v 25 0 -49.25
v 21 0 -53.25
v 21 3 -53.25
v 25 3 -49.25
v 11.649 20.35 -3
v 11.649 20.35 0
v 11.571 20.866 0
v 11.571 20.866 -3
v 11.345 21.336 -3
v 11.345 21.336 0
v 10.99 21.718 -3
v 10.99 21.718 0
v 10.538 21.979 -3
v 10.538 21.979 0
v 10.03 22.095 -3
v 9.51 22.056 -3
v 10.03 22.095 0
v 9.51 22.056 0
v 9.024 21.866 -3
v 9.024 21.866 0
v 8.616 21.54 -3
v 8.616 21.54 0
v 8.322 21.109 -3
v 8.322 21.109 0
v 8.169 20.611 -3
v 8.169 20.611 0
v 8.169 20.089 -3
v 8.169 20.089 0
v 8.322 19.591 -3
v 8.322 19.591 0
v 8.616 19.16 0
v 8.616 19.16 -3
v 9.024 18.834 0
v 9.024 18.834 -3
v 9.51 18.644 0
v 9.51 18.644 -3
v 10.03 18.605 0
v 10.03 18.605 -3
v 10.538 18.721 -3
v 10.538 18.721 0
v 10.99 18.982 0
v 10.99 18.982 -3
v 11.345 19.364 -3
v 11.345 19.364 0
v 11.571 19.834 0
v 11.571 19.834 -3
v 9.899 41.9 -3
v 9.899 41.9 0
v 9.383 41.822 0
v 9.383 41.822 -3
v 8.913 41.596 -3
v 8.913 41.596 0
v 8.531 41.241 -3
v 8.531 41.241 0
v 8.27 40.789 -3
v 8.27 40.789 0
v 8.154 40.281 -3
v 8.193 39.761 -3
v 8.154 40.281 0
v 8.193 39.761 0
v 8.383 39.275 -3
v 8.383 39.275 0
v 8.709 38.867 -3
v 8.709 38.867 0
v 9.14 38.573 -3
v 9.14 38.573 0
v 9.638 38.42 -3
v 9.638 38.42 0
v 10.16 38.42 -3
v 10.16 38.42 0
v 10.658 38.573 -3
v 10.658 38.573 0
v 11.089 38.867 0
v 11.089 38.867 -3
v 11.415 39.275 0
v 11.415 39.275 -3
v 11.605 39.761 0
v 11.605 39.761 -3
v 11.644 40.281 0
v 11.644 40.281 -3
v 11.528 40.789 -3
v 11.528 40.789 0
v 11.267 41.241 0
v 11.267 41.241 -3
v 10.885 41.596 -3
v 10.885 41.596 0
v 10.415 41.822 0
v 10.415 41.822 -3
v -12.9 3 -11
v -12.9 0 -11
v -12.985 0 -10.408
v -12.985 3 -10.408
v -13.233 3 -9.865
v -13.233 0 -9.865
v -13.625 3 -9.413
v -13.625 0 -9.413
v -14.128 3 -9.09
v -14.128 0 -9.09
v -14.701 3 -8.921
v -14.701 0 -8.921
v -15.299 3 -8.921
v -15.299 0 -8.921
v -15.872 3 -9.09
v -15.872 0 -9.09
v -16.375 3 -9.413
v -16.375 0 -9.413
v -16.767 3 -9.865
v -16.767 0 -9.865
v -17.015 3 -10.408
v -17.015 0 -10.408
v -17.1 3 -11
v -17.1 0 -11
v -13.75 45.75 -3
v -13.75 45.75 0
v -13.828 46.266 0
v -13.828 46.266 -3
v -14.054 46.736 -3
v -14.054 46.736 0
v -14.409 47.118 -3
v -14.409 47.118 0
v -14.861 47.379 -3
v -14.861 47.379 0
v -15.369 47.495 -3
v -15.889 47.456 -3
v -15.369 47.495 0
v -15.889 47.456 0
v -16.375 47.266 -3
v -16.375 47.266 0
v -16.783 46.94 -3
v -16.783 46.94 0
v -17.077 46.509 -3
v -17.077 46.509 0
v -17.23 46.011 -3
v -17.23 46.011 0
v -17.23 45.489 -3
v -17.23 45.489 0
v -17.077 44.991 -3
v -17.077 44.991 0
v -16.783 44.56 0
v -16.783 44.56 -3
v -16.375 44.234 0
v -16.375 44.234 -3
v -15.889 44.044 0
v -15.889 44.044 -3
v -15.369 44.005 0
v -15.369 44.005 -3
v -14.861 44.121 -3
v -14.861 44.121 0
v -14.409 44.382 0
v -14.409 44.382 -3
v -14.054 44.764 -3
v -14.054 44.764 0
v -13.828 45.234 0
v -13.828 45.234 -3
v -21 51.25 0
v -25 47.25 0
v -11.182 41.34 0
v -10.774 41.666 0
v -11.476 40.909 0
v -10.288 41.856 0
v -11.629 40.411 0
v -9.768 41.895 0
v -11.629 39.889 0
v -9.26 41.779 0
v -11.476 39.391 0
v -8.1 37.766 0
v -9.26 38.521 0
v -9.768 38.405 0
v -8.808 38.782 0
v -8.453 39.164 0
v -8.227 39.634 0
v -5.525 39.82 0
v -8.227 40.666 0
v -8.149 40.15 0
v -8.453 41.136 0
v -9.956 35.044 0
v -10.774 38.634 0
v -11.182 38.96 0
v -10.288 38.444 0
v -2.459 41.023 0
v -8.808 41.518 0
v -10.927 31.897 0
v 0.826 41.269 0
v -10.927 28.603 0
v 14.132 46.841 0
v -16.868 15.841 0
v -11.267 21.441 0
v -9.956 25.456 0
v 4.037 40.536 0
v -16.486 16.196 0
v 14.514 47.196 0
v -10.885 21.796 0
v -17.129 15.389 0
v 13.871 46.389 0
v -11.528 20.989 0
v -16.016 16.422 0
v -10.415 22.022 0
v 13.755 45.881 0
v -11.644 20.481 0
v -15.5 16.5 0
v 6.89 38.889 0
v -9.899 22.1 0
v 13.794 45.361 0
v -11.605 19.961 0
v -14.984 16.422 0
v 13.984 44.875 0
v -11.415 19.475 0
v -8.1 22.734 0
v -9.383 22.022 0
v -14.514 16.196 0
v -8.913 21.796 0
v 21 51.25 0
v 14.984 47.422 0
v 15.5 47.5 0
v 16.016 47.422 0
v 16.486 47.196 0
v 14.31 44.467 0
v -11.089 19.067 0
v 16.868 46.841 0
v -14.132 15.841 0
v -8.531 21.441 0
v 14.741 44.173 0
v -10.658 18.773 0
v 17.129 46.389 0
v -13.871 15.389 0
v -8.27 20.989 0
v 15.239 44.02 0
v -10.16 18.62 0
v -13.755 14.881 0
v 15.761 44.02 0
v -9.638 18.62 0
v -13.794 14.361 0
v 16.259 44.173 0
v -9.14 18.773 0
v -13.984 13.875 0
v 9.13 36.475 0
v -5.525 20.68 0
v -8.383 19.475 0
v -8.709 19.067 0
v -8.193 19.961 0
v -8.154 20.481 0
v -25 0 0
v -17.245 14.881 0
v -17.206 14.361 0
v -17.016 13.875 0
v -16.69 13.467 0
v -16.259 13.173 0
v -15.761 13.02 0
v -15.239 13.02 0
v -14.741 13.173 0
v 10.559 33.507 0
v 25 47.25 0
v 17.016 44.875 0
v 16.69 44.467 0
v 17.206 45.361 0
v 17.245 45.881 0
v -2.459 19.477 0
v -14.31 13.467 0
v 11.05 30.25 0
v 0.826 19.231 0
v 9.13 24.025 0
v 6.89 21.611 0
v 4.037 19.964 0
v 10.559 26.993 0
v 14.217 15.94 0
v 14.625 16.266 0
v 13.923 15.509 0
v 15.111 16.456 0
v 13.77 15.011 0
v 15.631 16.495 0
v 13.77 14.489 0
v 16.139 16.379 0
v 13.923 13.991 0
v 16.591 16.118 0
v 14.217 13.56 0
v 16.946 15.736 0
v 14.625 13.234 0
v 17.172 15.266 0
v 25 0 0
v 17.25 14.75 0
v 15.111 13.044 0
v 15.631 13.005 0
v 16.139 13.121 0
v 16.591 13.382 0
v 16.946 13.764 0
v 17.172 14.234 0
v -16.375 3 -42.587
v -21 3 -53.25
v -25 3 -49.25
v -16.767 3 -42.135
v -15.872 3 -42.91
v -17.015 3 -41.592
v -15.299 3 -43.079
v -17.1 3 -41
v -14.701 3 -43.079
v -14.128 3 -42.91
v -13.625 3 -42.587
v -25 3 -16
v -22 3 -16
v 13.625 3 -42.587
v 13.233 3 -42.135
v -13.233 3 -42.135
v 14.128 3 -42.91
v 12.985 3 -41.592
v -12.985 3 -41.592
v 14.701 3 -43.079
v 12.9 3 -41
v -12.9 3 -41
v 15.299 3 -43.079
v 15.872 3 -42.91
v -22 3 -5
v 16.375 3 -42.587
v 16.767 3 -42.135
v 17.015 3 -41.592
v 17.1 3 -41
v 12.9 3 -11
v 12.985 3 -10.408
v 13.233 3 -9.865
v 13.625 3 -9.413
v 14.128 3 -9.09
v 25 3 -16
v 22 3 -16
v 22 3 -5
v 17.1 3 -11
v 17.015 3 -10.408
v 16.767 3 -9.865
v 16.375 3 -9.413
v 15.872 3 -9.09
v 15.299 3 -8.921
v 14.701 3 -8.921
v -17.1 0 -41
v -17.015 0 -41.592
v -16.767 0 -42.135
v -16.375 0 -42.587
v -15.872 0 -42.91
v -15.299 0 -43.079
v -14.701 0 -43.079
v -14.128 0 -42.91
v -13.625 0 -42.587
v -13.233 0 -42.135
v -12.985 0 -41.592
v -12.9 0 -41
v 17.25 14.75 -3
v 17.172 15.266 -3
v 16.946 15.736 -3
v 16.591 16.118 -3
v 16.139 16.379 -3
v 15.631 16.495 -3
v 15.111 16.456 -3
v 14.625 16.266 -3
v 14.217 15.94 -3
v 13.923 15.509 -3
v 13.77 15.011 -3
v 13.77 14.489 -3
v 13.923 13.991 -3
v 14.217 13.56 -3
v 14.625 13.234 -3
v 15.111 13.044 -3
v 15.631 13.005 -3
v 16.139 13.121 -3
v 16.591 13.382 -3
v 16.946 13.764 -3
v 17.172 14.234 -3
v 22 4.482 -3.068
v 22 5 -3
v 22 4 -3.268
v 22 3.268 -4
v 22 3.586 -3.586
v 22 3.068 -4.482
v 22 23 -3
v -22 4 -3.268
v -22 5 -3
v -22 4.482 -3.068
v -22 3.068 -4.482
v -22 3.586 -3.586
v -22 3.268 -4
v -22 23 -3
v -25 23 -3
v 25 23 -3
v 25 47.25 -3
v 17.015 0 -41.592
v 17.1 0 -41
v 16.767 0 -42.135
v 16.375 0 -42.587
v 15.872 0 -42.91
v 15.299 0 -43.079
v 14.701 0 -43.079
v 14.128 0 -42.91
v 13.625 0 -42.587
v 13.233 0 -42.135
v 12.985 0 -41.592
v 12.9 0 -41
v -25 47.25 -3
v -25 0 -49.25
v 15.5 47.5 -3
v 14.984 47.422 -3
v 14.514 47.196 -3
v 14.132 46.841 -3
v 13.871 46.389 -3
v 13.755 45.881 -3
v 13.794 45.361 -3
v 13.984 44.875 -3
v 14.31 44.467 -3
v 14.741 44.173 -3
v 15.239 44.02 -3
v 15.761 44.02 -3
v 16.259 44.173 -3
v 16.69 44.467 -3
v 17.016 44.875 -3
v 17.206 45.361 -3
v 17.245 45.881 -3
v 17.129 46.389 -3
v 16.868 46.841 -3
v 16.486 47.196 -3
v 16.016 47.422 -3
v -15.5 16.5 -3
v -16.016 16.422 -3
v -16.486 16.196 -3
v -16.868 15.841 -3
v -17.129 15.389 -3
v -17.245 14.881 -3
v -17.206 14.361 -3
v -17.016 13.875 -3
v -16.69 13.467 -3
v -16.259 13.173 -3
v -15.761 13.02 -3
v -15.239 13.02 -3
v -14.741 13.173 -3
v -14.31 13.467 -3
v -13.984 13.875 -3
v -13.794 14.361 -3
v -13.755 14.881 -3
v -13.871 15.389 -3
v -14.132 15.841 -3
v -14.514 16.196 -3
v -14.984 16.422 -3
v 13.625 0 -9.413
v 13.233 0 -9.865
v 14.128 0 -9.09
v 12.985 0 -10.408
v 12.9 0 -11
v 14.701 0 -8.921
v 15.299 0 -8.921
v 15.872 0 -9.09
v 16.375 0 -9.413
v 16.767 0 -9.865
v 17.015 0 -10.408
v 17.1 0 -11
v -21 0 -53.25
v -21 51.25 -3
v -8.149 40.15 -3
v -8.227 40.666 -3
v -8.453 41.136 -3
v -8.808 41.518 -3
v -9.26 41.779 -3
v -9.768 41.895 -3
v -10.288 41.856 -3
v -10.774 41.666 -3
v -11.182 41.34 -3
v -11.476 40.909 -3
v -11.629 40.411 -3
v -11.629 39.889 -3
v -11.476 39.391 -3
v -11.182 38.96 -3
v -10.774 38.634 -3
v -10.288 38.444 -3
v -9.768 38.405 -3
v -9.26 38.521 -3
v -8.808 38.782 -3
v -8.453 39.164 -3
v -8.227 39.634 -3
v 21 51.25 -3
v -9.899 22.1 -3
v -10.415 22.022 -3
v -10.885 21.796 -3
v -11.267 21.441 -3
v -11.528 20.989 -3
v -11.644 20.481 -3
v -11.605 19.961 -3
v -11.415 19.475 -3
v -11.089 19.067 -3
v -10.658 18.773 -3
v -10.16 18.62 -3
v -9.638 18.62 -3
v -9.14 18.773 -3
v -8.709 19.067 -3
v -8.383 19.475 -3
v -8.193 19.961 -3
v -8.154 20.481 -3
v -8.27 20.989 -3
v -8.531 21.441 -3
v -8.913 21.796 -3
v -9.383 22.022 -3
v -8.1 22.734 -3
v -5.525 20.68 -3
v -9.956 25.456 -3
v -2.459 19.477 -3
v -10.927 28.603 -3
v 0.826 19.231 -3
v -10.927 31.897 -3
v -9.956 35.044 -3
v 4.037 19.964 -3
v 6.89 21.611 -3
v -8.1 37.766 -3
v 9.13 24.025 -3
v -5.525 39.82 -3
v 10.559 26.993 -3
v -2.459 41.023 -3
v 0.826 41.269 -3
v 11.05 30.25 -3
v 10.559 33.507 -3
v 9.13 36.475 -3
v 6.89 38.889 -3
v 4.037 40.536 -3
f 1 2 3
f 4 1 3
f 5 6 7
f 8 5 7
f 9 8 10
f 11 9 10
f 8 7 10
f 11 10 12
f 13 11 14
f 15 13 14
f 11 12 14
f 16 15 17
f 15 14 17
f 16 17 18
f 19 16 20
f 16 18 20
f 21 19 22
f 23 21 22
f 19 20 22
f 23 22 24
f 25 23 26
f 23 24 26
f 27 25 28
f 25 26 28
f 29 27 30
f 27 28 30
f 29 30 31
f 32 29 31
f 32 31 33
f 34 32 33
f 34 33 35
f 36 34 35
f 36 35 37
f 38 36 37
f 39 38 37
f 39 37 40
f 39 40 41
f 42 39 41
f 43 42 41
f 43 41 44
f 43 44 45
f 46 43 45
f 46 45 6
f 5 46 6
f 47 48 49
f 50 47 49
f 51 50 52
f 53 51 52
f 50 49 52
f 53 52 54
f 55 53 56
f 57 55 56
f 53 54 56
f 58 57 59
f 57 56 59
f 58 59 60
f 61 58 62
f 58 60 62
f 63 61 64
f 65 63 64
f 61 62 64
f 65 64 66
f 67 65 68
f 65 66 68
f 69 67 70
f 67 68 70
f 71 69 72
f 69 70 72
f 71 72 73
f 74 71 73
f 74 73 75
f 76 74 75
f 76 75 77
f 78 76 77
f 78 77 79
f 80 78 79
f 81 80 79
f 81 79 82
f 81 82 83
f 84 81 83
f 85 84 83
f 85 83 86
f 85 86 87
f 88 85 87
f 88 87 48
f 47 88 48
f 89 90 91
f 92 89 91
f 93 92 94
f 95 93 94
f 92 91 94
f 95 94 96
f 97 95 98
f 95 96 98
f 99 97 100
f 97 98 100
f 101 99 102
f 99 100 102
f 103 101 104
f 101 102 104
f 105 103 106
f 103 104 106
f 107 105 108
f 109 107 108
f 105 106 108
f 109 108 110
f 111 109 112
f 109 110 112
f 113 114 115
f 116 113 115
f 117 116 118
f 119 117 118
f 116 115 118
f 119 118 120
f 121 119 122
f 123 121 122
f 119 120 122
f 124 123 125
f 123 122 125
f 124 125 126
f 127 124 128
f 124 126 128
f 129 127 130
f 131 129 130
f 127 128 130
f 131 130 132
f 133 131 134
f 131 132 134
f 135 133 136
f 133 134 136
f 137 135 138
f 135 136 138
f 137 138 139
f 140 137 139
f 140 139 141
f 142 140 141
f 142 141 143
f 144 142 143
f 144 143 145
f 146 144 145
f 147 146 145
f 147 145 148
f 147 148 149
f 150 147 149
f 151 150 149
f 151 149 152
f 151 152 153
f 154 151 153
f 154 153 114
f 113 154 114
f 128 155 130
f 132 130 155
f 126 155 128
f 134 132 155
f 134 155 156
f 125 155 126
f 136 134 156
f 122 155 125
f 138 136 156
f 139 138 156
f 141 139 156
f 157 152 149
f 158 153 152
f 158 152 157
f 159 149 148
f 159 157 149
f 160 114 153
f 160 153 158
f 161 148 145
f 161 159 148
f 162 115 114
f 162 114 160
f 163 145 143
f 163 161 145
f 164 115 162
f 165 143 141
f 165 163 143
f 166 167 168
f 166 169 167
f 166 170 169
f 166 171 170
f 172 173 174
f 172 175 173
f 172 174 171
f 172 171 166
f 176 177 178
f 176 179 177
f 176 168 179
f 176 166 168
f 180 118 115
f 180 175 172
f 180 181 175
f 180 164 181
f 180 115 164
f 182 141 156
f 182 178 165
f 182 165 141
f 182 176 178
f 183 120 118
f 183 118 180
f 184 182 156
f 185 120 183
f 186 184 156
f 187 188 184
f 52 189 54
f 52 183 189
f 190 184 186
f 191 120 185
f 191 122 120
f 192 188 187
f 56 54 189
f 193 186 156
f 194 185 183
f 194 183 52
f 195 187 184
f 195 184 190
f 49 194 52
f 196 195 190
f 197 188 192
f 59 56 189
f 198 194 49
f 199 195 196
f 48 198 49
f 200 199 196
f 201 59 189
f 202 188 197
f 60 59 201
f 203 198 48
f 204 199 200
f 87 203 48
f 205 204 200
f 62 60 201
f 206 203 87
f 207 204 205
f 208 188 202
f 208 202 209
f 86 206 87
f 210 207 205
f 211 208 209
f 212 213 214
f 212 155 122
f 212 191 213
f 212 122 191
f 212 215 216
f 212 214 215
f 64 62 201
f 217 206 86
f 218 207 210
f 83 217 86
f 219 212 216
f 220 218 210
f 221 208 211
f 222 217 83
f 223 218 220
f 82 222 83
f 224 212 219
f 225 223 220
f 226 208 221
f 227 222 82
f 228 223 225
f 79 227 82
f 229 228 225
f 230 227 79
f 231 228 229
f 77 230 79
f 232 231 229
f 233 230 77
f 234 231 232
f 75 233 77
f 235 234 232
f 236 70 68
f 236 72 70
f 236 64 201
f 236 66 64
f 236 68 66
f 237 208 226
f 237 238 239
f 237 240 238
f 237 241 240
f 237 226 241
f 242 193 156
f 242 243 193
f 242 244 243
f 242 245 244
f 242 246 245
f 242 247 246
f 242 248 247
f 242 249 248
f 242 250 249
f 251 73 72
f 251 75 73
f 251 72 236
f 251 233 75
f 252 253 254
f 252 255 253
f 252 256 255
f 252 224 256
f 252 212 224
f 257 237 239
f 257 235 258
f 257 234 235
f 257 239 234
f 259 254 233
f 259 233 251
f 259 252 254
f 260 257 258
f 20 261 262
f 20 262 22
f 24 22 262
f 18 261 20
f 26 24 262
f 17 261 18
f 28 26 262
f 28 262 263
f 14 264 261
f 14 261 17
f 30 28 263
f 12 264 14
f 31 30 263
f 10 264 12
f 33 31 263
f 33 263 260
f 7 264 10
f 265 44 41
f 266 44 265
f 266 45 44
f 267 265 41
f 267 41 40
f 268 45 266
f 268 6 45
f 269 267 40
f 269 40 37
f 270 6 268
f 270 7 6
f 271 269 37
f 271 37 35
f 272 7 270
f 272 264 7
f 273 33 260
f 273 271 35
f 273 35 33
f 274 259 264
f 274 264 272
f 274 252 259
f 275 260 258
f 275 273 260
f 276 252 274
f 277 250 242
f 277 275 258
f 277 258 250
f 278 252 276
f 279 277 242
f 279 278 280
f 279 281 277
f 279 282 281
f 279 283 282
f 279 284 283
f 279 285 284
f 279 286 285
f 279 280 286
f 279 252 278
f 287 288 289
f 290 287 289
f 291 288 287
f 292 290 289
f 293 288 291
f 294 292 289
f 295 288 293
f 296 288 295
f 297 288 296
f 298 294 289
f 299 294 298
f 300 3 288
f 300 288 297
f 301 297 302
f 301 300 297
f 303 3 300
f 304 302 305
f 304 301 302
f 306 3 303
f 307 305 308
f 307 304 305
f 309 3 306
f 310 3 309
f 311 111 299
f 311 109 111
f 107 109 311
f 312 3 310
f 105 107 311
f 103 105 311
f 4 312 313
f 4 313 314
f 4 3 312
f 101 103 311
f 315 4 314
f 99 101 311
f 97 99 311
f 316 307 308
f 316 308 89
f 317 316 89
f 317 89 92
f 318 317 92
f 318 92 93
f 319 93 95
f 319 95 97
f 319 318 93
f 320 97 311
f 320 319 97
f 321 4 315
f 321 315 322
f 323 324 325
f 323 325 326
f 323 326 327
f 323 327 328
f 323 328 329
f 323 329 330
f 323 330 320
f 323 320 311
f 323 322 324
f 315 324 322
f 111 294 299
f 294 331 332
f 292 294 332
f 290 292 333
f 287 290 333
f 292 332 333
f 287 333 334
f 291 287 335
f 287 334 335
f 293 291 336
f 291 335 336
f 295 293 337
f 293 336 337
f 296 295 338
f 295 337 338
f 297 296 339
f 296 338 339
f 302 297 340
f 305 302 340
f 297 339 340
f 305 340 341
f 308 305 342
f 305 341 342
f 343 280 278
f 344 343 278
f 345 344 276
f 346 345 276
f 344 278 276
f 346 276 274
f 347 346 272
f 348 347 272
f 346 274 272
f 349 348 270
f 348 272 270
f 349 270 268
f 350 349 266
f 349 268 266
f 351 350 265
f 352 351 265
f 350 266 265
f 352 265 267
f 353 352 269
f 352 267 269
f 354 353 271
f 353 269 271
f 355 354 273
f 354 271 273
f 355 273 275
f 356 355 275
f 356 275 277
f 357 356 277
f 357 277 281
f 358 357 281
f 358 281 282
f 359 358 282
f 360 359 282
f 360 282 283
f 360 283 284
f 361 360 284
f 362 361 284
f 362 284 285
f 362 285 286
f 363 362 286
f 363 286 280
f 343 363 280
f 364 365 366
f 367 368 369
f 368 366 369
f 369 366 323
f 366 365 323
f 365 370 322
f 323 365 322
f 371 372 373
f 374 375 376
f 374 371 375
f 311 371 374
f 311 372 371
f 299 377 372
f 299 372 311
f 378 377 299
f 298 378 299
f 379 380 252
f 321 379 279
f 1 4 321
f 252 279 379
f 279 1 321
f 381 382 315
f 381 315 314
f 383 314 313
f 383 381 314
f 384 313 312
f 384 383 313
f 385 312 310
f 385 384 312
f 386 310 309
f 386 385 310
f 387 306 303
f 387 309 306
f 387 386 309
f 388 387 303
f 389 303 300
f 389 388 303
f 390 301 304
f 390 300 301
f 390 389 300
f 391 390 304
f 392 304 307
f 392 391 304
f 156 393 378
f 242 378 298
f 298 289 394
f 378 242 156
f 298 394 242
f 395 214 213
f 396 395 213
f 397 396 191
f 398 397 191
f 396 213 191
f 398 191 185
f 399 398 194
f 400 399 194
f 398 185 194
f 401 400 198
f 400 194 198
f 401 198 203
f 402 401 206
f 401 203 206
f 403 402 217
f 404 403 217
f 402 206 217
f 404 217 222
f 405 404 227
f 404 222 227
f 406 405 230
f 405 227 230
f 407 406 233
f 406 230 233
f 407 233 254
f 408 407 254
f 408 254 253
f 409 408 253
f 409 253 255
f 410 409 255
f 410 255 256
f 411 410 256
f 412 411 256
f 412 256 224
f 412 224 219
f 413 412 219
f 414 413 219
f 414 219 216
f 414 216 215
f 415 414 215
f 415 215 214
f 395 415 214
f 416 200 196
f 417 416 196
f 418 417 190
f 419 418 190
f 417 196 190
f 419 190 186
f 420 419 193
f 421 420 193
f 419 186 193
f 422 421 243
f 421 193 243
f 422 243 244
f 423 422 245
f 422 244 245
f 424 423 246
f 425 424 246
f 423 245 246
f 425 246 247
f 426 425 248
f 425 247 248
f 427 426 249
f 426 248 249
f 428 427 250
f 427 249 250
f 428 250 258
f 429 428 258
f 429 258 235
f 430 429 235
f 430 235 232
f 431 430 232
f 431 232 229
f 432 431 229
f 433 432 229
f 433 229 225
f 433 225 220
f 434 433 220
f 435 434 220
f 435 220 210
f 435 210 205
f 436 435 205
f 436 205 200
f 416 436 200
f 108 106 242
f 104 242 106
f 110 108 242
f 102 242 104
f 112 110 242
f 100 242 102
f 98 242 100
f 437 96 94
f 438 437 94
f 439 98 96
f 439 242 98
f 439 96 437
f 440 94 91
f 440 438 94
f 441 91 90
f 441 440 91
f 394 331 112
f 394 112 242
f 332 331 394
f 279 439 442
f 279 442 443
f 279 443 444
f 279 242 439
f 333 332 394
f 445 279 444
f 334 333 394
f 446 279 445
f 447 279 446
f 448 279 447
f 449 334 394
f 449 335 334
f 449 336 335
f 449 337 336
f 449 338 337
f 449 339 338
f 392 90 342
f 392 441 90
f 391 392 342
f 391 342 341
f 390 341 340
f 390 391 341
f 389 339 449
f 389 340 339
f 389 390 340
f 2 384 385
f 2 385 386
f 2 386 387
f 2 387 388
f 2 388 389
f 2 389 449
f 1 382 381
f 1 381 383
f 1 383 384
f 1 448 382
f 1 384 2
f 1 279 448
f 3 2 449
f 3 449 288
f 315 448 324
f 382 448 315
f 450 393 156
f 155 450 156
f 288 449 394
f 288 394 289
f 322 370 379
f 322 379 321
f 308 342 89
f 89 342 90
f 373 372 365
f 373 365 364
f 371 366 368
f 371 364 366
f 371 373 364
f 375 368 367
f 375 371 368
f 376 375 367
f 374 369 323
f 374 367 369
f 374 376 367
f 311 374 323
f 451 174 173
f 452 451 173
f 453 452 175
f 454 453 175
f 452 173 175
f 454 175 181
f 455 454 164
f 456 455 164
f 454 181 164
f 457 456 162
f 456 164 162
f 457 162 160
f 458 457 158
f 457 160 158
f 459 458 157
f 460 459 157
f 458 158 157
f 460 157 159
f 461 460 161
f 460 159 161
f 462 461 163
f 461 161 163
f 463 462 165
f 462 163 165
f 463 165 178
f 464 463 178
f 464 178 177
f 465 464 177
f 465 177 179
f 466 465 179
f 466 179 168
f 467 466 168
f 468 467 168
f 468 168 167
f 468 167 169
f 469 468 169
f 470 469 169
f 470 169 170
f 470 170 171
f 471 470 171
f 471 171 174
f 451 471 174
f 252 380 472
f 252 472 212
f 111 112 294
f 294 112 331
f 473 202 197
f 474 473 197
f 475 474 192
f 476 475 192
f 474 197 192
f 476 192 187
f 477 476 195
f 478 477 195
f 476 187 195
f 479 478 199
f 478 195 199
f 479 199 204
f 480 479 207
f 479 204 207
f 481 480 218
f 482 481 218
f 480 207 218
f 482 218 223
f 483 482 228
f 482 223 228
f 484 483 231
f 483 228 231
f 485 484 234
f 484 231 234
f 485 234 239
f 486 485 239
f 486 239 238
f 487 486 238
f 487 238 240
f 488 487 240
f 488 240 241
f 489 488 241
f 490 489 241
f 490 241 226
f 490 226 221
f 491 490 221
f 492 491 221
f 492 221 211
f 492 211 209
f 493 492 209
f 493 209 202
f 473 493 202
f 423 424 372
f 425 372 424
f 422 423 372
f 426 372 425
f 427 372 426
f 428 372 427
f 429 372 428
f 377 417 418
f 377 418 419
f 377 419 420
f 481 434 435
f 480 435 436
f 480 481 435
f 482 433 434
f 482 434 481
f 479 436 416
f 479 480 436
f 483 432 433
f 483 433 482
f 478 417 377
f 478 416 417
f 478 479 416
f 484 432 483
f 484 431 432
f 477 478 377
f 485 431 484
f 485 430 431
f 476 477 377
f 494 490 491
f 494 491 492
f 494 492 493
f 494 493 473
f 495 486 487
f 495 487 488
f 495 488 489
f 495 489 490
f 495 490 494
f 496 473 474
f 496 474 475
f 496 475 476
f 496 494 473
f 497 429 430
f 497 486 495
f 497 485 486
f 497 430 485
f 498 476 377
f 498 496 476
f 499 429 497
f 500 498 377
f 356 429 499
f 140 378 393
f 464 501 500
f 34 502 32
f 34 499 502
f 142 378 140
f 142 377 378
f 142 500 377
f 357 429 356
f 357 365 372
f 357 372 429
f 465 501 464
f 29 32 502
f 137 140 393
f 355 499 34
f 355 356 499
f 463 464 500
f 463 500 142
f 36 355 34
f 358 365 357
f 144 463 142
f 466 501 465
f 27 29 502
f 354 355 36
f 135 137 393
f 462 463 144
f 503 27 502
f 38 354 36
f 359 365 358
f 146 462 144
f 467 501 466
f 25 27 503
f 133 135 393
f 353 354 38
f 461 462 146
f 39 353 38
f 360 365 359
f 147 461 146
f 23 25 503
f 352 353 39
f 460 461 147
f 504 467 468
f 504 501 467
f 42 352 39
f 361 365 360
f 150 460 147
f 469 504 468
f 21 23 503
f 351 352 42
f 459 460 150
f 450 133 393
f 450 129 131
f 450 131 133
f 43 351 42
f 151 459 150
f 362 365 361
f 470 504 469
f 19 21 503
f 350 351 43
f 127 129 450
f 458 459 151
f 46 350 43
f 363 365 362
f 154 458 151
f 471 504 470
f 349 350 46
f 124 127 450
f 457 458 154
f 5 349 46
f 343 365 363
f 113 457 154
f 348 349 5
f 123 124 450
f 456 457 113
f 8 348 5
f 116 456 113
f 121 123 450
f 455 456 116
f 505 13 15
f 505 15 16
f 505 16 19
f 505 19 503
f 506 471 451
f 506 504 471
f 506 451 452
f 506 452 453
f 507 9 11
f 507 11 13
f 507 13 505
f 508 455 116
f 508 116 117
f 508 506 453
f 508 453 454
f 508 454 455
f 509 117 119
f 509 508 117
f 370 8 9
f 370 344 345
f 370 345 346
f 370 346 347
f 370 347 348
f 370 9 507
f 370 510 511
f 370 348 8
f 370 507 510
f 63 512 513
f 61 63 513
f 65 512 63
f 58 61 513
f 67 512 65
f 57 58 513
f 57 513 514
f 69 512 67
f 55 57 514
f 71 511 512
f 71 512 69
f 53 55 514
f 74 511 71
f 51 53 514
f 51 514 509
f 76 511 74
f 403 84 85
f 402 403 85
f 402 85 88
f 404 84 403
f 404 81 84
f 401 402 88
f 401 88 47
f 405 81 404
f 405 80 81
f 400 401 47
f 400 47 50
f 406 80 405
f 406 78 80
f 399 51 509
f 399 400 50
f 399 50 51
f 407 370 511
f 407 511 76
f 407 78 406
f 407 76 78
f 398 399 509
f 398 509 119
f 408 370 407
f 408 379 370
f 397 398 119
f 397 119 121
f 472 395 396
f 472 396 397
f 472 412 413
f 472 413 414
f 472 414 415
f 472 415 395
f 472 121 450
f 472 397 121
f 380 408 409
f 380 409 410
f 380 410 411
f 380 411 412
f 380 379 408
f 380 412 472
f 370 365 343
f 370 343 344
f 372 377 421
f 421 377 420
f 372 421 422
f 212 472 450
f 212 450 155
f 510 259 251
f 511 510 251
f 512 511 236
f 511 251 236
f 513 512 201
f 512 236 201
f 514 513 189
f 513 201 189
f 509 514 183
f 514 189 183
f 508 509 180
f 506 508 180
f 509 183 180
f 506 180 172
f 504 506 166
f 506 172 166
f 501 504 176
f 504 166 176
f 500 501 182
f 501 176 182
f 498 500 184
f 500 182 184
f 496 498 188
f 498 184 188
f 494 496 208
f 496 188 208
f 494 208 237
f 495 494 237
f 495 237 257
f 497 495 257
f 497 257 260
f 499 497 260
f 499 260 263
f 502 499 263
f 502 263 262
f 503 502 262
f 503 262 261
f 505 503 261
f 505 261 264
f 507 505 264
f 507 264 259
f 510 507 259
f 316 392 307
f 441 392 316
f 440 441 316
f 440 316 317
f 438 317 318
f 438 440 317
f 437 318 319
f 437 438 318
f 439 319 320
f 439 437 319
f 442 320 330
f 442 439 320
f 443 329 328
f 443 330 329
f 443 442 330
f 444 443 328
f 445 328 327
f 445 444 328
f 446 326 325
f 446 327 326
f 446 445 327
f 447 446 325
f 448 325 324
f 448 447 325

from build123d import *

# Parameters (mm, degrees)
EXTRUDE_THIN1_DEPTH = 25
SKETCH2_R           = 11.05
SKETCH2_R_2         = 1.75
CUT_EXTRUDE1_DEPTH  = 79.02002948
CHAMFER1_SIZE       = 4
CUT_EXTRUDE3_DEPTH  = 79.02002948
FILLET1_R           = 2
RIB1_REACH          = 91.231
SKETCH6_WALL_W      = 204.315201322
SKETCH6_WALL_H      = 3


with BuildPart() as part:
    # Sketch1 → Extrude-Thin1 (new, symmetric)
    with BuildSketch(Plane(origin=(0, 0, 0), x_dir=(0, 0, -1), z_dir=(1, 0, 0))):
        Polygon((0, 51.25), (0, 0), (53.25, 0), (53.25, 3), (3, 3), (3, 51.25), align=None)
    extrude(amount=EXTRUDE_THIN1_DEPTH, both=True)

    # Sketch2 → Cut-Extrude1 (cut, through all)
    with BuildSketch(Plane.XY):
        with Locations((0, 30.25)):
            Circle(SKETCH2_R)
        with Locations((-9.898989847, 40.15)):
            Circle(SKETCH2_R_2)
        with Locations((-15.5, 45.75)):
            Circle(SKETCH2_R_2)
        with Locations((9.898989847, 40.15)):
            Circle(SKETCH2_R_2)
        with Locations((15.5, 45.75)):
            Circle(SKETCH2_R_2)
        with Locations((15.5, 14.75)):
            Circle(SKETCH2_R_2)
        with Locations((9.898989847, 20.35)):
            Circle(SKETCH2_R_2)
        with Locations((-9.898989847, 20.35)):
            Circle(SKETCH2_R_2)
        with Locations((-15.5, 14.75)):
            Circle(SKETCH2_R_2)
    extrude(amount=-CUT_EXTRUDE1_DEPTH, mode=Mode.SUBTRACT)

    # Chamfer1
    chamfer1_edges = [part.edges().sort_by_distance(p)[0] for p in [
        (25, 1.5, -53.25),
        (-25, 1.5, -53.25),
        (-25, 51.25, -1.5),
        (25, 51.25, -1.5),
    ]]
    chamfer(chamfer1_edges, length=CHAMFER1_SIZE)

    # Sketch4 → Cut-Extrude3 (cut, through all)
    with BuildSketch(Plane(origin=(0, 0, 0), x_dir=(1, 0, 0), z_dir=(0, 1, 0))):
        with BuildLine():
            Line((-12.9, 41), (-12.9, 11))
            ThreePointArc((-12.9, 11), (-15, 8.9), (-17.1, 11))
            Line((-17.1, 11), (-17.1, 41))
            ThreePointArc((-17.1, 41), (-15, 43.1), (-12.9, 41))
        make_face()
        with BuildLine():
            Line((12.9, 41), (12.9, 11))
            ThreePointArc((12.9, 11), (15, 8.9), (17.1, 11))
            Line((17.1, 11), (17.1, 41))
            ThreePointArc((17.1, 41), (15, 43.1), (12.9, 41))
        make_face()
    extrude(amount=CUT_EXTRUDE3_DEPTH, mode=Mode.SUBTRACT)

    # Fillet1
    fillet1_edges = [part.edges().sort_by_distance(p)[0] for p in [
        (0, 3, -3),
    ]]
    fillet(fillet1_edges, radius=FILLET1_R)

    # Sketch6 wall → Rib1 (add, up to next)
    with BuildSketch(Plane(origin=(25, 13, -9.5), x_dir=(0, -0.838443616301, -0.544988350595), z_dir=(0, 0.544988350595, -0.838443616301)), mode=Mode.PRIVATE) as rib1_sk1:
        with Locations((0, 1.5)):
            Rectangle(SKETCH6_WALL_W, SKETCH6_WALL_H)
    rib1_tool1 = extrude(rib1_sk1.sketch, amount=-RIB1_REACH, mode=Mode.PRIVATE) - part.part
    rib1 = rib1_tool1.solids().sort_by_distance((25, 13, -9.5))[0]
    add(rib1)

    # Mirror1: Rib1 across plane
    add(rib1.mirror(Plane(origin=(0, 0, 0), x_dir=(0, 0, 1), z_dir=(1, 0, 0))))


solid = part.part
